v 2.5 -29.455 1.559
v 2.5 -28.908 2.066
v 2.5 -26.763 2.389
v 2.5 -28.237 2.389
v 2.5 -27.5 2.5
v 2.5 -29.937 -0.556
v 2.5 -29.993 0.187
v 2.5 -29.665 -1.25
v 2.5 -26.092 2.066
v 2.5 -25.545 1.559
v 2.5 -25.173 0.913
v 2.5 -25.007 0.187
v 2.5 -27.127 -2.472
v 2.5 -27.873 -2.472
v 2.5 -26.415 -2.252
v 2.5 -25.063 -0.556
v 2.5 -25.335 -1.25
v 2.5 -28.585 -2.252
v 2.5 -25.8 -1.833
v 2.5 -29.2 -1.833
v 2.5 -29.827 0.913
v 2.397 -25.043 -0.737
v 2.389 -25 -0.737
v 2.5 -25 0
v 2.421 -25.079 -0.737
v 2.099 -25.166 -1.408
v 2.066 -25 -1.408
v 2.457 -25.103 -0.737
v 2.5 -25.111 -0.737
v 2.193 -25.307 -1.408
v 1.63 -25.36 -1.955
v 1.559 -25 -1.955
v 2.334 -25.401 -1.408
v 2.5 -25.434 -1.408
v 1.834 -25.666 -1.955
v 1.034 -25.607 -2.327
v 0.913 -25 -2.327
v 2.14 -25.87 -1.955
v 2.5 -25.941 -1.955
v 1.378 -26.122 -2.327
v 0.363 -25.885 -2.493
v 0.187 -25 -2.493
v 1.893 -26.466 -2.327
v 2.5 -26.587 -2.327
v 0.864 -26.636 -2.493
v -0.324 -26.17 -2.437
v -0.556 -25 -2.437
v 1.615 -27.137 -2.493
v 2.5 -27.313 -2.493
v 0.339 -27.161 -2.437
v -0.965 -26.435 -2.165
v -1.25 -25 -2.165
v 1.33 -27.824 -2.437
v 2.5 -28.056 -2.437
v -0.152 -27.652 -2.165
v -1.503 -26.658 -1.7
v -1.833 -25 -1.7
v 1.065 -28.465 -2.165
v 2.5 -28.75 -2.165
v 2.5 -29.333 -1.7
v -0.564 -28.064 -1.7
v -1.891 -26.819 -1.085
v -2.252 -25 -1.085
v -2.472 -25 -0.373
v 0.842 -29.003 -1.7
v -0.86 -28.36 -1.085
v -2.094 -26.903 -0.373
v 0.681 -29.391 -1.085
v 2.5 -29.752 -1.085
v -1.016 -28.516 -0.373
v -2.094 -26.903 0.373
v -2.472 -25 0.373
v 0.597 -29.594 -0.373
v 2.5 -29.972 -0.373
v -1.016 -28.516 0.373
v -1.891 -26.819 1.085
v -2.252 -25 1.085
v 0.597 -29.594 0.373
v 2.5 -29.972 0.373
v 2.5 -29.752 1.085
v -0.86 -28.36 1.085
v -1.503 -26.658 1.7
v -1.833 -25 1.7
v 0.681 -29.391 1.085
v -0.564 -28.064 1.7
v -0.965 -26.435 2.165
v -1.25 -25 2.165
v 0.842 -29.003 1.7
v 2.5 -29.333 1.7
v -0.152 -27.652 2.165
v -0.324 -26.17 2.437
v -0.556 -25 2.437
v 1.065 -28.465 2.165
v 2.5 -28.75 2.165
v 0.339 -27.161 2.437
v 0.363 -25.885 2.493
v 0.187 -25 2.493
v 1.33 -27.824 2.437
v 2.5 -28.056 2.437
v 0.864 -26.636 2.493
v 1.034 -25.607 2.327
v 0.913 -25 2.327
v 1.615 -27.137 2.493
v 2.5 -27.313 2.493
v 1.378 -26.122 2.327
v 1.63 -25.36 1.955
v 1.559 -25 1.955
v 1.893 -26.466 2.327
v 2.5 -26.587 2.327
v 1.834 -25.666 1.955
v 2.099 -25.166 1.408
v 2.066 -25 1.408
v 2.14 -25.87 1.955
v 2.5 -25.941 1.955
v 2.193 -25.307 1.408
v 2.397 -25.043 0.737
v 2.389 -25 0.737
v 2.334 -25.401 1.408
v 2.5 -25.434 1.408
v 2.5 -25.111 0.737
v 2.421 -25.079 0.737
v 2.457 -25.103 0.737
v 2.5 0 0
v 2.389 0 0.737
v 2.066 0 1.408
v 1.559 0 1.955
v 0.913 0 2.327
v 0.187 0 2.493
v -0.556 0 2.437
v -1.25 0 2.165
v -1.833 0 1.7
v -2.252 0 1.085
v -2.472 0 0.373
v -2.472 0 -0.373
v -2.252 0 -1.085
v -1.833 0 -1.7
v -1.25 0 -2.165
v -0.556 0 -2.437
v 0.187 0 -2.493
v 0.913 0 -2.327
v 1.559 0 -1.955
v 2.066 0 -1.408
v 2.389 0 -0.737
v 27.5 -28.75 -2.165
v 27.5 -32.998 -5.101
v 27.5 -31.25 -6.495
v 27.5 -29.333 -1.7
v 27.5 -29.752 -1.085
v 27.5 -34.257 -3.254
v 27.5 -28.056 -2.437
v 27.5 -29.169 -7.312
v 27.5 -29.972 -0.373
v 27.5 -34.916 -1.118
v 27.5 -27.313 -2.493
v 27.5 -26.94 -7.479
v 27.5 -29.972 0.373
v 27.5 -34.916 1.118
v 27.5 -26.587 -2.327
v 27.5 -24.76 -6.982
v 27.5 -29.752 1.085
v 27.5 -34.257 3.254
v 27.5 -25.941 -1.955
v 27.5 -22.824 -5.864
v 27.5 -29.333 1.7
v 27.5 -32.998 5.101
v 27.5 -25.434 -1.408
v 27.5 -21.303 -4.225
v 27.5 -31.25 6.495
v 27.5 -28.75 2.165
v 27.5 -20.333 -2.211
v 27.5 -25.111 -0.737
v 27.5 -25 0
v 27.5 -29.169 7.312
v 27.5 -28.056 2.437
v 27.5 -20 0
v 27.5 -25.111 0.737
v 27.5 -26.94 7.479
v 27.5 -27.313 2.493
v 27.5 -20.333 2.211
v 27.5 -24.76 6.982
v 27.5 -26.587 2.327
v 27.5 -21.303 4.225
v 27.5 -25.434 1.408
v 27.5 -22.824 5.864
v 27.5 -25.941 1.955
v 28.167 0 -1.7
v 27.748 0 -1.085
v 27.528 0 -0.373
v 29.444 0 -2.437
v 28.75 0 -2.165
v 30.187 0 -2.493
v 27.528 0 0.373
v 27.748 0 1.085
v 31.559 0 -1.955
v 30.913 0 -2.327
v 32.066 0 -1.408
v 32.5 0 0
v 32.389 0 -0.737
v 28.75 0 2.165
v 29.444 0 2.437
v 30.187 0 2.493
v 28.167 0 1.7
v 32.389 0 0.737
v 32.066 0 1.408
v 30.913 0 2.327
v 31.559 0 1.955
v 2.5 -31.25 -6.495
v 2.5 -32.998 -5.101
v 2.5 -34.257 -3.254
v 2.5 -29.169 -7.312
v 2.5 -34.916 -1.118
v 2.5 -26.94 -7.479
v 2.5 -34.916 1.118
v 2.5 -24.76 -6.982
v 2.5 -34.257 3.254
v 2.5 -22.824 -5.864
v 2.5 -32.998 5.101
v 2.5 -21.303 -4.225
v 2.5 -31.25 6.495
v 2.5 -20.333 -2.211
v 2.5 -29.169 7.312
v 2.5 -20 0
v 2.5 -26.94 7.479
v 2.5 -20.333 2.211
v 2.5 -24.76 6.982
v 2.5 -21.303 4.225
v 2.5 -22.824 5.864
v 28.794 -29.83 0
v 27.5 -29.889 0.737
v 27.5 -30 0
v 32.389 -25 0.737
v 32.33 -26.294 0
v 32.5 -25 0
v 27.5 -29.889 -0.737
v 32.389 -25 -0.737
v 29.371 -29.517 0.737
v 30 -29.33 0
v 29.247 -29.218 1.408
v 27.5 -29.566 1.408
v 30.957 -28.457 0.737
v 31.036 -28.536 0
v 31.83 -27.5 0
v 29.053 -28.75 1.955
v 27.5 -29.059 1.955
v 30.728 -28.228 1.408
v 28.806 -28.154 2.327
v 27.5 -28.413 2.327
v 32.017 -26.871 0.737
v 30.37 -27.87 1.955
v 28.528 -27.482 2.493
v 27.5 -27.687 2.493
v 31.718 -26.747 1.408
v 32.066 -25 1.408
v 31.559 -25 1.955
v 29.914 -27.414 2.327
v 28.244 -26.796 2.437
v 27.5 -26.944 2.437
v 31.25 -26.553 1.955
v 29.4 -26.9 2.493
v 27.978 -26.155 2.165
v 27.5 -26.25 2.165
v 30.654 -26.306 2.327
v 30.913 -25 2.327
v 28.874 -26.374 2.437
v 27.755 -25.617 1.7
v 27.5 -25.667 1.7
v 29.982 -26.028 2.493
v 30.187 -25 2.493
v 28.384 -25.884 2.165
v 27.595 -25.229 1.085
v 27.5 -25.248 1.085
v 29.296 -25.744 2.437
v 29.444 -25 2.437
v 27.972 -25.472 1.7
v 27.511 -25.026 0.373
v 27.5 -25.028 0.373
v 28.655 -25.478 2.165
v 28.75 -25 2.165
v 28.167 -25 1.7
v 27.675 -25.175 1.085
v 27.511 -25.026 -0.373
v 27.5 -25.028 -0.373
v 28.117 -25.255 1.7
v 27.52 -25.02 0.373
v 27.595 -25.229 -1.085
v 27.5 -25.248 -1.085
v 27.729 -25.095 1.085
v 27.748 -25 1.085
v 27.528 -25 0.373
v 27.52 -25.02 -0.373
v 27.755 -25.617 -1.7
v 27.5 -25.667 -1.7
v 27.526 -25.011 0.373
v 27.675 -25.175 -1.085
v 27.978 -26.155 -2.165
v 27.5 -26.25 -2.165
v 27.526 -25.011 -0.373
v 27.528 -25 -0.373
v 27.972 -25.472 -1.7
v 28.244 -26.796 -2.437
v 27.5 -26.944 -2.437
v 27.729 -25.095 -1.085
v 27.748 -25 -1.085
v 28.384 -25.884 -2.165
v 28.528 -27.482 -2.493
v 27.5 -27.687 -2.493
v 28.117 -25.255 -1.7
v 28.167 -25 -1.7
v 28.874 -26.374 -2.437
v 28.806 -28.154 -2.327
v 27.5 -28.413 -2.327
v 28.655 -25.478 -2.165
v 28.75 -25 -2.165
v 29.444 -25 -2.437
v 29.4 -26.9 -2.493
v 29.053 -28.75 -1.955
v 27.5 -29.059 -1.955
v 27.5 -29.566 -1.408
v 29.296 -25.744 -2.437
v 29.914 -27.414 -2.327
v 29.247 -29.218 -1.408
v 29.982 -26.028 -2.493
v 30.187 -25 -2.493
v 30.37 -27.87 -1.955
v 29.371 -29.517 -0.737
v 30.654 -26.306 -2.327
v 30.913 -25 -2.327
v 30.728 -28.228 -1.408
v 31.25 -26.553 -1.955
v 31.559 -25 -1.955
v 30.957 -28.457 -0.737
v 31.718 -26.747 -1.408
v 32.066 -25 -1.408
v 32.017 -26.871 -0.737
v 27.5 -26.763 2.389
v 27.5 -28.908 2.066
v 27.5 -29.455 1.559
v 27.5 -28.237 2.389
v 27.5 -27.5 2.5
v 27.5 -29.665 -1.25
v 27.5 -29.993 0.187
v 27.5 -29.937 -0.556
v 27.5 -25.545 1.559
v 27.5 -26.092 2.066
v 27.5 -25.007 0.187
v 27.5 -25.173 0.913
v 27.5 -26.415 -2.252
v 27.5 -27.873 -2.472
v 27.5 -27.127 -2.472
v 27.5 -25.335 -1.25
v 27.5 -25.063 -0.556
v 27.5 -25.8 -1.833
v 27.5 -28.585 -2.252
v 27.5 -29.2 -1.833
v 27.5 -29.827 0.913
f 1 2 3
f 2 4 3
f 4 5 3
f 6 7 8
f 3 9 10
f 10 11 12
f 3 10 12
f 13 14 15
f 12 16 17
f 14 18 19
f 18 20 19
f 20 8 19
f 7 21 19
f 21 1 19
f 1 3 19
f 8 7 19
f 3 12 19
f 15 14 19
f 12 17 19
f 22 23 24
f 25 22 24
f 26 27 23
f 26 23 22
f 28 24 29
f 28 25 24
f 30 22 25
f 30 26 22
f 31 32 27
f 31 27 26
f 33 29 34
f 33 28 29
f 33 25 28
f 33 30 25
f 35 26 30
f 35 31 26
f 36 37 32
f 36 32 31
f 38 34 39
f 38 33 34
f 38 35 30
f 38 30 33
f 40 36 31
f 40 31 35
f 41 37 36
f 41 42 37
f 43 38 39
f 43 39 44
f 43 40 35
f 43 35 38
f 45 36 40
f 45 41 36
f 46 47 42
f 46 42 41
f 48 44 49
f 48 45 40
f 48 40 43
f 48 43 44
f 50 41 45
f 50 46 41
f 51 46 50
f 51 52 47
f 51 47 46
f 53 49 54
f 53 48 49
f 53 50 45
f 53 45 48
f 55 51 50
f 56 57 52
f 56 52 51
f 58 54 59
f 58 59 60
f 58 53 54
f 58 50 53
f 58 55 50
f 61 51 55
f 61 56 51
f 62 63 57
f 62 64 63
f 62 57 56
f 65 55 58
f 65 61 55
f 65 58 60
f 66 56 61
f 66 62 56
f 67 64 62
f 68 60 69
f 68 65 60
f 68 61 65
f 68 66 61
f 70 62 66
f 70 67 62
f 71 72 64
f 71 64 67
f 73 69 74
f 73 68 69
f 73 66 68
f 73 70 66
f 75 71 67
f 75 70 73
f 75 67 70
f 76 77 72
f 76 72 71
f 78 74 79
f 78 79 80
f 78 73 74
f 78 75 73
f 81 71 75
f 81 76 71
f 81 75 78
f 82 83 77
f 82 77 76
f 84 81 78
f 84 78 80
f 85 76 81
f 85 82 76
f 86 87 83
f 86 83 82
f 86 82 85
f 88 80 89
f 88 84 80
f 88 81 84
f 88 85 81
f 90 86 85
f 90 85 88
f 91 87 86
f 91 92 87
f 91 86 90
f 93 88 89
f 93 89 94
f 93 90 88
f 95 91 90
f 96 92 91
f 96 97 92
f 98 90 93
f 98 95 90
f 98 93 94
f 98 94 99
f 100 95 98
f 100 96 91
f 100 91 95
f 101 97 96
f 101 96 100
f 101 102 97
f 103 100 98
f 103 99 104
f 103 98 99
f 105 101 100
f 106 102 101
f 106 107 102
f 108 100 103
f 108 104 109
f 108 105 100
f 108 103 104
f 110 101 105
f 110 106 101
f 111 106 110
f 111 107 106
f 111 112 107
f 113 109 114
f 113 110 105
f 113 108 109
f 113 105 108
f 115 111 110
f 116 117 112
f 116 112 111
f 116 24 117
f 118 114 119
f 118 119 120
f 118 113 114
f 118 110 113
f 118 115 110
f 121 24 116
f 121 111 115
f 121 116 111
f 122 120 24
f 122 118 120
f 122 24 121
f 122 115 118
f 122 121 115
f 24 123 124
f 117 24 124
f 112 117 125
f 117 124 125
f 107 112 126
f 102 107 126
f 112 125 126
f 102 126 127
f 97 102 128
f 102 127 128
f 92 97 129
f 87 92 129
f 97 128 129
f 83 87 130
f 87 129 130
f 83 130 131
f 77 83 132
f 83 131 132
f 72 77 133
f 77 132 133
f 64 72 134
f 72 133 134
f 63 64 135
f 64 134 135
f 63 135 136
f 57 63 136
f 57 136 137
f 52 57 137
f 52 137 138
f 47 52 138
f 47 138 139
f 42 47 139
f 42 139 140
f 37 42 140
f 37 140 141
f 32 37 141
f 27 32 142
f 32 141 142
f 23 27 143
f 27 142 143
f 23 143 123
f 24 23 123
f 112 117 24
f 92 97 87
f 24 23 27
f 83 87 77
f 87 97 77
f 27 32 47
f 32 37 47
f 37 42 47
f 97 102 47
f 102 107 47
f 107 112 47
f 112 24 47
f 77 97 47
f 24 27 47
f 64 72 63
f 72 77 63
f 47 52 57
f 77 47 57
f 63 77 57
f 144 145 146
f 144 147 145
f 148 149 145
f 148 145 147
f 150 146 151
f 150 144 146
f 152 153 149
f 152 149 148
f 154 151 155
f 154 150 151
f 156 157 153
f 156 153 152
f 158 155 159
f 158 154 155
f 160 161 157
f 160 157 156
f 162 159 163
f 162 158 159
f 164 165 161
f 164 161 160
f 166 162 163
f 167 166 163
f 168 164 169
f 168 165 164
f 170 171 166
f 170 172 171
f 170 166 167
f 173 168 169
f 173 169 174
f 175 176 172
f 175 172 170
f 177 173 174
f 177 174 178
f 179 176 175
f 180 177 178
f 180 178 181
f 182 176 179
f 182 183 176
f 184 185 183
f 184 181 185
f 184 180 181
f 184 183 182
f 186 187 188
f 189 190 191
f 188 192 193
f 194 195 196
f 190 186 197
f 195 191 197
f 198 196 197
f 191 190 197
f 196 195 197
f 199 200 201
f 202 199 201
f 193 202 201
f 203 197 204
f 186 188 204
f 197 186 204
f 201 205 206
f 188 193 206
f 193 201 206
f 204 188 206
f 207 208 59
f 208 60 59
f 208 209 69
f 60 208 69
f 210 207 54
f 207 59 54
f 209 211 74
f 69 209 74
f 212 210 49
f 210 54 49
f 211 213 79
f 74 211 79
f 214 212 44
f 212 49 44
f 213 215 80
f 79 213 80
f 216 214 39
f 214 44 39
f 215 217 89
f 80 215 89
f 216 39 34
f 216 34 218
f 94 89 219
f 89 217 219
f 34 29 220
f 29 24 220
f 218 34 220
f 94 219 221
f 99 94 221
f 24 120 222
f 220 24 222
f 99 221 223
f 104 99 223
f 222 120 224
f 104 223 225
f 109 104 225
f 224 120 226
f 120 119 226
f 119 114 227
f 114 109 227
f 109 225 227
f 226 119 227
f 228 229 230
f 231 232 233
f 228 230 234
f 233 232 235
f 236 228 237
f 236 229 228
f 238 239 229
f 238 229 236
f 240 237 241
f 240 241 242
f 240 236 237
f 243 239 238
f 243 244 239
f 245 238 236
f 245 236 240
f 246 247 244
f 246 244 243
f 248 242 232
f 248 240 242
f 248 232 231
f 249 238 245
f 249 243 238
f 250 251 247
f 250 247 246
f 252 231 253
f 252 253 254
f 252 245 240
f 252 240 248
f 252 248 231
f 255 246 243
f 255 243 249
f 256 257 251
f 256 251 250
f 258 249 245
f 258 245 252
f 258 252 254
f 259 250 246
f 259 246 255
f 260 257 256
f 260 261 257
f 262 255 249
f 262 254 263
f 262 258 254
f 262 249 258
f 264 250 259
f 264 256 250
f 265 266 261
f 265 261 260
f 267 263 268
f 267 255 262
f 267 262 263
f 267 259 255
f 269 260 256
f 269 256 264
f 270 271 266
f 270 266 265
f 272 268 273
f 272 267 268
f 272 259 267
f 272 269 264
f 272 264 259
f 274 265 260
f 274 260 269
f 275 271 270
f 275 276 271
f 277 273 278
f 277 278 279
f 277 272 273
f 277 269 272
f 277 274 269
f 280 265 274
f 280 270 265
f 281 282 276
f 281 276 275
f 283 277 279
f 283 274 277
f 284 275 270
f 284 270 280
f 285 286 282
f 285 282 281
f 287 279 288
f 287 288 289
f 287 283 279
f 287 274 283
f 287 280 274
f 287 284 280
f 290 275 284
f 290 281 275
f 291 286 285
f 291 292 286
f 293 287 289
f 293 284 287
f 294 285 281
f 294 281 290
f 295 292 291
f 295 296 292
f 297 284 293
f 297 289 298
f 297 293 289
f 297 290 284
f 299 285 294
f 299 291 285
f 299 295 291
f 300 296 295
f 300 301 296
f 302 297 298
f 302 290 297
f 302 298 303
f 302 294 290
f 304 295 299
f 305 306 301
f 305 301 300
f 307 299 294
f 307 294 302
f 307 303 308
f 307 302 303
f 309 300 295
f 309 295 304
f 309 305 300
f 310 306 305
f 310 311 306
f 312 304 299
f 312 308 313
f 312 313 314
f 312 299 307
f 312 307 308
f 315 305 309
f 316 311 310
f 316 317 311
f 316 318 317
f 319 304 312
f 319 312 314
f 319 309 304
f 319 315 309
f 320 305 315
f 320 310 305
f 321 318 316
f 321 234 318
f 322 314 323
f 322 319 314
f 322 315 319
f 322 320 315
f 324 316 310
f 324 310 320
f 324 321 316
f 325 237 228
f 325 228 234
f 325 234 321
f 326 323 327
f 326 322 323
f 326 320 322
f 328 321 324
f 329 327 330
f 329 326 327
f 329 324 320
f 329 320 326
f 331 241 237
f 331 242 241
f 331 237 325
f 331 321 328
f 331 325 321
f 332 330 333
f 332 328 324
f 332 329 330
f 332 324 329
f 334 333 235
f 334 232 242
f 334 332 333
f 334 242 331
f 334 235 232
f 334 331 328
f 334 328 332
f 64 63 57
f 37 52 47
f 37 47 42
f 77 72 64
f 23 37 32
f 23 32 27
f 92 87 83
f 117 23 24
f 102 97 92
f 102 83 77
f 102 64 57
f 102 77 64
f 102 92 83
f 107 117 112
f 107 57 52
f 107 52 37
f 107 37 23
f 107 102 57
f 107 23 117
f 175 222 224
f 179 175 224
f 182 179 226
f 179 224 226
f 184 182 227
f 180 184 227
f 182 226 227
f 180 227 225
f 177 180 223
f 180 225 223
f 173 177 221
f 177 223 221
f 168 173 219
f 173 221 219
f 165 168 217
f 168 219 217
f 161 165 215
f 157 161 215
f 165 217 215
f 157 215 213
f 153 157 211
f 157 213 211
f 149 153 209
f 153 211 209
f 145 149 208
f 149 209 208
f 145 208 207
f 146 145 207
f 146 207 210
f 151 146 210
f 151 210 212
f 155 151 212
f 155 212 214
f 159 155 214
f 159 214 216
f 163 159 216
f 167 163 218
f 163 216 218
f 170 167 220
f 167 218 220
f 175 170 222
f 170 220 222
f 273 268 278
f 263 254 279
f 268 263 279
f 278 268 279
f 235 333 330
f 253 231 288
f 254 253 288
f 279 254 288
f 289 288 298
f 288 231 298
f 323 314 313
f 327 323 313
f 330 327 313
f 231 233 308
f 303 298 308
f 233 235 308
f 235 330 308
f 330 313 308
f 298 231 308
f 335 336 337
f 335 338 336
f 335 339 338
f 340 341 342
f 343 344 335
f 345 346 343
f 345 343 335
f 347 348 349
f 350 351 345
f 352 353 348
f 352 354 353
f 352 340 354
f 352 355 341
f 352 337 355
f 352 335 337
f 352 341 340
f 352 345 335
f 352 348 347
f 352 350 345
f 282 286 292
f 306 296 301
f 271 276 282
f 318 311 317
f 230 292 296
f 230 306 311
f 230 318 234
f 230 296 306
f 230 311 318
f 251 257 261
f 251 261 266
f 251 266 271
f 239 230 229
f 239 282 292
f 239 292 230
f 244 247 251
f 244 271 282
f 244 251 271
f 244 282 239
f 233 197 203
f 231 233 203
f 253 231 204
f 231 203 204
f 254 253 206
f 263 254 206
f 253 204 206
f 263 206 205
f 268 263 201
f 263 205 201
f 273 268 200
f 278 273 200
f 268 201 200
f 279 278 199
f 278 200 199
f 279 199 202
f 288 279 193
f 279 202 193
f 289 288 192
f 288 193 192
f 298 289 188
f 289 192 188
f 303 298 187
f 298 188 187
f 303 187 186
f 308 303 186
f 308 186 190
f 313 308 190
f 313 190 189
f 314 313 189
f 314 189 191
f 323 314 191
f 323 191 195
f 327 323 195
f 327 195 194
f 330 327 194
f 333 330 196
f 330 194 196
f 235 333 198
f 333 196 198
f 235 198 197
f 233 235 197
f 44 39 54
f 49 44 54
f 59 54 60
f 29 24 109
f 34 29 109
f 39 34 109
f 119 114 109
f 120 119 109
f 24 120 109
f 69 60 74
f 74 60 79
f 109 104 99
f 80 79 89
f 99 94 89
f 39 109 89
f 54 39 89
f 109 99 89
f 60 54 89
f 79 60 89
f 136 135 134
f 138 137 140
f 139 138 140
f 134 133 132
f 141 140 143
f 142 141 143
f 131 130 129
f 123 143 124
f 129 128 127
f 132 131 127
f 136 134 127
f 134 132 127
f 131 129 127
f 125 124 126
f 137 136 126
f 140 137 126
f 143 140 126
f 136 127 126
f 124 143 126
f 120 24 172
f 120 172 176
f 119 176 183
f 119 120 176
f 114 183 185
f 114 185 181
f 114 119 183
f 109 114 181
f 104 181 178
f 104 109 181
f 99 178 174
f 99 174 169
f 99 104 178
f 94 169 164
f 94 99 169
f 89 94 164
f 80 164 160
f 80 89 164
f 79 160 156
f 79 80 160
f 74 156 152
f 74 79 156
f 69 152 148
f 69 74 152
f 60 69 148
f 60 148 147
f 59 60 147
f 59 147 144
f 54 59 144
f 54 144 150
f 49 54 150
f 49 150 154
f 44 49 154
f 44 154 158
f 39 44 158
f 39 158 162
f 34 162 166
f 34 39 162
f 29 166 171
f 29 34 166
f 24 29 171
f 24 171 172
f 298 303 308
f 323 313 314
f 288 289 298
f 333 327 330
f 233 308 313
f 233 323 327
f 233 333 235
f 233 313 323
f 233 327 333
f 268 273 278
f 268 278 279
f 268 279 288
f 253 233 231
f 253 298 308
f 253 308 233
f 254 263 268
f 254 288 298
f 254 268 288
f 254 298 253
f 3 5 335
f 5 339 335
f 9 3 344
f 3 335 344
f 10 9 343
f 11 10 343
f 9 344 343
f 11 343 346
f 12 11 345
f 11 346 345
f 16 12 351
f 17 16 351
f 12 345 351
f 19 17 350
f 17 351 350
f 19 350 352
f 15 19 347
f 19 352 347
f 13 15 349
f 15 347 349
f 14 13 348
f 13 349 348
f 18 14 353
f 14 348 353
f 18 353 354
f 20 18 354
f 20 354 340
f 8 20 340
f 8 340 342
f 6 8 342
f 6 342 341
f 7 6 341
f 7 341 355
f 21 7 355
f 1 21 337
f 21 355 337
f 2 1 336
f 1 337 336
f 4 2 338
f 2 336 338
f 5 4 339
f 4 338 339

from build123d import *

# Parameters (mm, degrees)
F0_R      = 2.5
F1_DEPTH  = 25
F3_W      = 25
F3_H      = 2.5
F1_FACE_R = 2.5
F9_R      = 7.5
F9_R_2    = 2.5
F10_DEPTH = 25


with BuildPart() as f1:
    # F0 (on Front) → F1 (new body)
    with BuildSketch(Plane.XZ):
        Circle(F0_R)
    extrude(amount=F1_DEPTH)


with BuildPart() as f1b:
    # F0 (on Front) → F1, piece 2 (new body)
    with BuildSketch(Plane.XZ):
        with BuildLine():
            ThreePointArc((27.5, 0), (30, -2.5), (32.5, 0))
            ThreePointArc((32.5, 0), (30, 2.5), (27.5, 0))
        make_face()
    extrude(amount=F1_DEPTH)


with BuildPart() as f4:
    # F3 (on offset) → F4 (revolve)
    with BuildSketch(Plane.XZ.offset(27.5)):
        with Locations((15, 1.25)):
            Rectangle(F3_W, F3_H)
    revolve(axis=Axis((15, -27.5, 0), (-1, 0, 0)))


with BuildPart() as f6:
    # F6: sweep along a path in F5
    with BuildLine(Plane.XY) as f6_path:
        ThreePointArc((0, -25), (0.732233047, -26.767766953), (2.5, -27.5))
    # F1_face (on face) → F6 (sweep)
    with BuildSketch(Plane.XZ.offset(25)):
        Circle(F1_FACE_R)
    sweep(path=f6_path.line)


with BuildPart() as f10:
    # F9 (on offset) → F10 (new body)
    with BuildSketch(Plane.YZ.offset(2.5)):
        with Locations((-27.5, 0)):
            Circle(F9_R)
        with Locations((-27.5, 0)):
            Circle(F9_R_2, mode=Mode.SUBTRACT)
    extrude(amount=F10_DEPTH)


with BuildPart() as f11:
    # F11: sweep along a path in F7
    with BuildLine(Plane.XY) as f11_path:
        ThreePointArc((27.5, -27.5), (29.267766953, -26.767766953), (30, -25))
    # F1_face (on face) → F11 (sweep)
    with BuildSketch(Plane.XZ.offset(25)):
        with Locations((30, 0)):
            Circle(F1_FACE_R)
    sweep(path=f11_path.line)


solid = Compound([f1.part, f1b.part, f4.part, f6.part, f10.part, f11.part])
